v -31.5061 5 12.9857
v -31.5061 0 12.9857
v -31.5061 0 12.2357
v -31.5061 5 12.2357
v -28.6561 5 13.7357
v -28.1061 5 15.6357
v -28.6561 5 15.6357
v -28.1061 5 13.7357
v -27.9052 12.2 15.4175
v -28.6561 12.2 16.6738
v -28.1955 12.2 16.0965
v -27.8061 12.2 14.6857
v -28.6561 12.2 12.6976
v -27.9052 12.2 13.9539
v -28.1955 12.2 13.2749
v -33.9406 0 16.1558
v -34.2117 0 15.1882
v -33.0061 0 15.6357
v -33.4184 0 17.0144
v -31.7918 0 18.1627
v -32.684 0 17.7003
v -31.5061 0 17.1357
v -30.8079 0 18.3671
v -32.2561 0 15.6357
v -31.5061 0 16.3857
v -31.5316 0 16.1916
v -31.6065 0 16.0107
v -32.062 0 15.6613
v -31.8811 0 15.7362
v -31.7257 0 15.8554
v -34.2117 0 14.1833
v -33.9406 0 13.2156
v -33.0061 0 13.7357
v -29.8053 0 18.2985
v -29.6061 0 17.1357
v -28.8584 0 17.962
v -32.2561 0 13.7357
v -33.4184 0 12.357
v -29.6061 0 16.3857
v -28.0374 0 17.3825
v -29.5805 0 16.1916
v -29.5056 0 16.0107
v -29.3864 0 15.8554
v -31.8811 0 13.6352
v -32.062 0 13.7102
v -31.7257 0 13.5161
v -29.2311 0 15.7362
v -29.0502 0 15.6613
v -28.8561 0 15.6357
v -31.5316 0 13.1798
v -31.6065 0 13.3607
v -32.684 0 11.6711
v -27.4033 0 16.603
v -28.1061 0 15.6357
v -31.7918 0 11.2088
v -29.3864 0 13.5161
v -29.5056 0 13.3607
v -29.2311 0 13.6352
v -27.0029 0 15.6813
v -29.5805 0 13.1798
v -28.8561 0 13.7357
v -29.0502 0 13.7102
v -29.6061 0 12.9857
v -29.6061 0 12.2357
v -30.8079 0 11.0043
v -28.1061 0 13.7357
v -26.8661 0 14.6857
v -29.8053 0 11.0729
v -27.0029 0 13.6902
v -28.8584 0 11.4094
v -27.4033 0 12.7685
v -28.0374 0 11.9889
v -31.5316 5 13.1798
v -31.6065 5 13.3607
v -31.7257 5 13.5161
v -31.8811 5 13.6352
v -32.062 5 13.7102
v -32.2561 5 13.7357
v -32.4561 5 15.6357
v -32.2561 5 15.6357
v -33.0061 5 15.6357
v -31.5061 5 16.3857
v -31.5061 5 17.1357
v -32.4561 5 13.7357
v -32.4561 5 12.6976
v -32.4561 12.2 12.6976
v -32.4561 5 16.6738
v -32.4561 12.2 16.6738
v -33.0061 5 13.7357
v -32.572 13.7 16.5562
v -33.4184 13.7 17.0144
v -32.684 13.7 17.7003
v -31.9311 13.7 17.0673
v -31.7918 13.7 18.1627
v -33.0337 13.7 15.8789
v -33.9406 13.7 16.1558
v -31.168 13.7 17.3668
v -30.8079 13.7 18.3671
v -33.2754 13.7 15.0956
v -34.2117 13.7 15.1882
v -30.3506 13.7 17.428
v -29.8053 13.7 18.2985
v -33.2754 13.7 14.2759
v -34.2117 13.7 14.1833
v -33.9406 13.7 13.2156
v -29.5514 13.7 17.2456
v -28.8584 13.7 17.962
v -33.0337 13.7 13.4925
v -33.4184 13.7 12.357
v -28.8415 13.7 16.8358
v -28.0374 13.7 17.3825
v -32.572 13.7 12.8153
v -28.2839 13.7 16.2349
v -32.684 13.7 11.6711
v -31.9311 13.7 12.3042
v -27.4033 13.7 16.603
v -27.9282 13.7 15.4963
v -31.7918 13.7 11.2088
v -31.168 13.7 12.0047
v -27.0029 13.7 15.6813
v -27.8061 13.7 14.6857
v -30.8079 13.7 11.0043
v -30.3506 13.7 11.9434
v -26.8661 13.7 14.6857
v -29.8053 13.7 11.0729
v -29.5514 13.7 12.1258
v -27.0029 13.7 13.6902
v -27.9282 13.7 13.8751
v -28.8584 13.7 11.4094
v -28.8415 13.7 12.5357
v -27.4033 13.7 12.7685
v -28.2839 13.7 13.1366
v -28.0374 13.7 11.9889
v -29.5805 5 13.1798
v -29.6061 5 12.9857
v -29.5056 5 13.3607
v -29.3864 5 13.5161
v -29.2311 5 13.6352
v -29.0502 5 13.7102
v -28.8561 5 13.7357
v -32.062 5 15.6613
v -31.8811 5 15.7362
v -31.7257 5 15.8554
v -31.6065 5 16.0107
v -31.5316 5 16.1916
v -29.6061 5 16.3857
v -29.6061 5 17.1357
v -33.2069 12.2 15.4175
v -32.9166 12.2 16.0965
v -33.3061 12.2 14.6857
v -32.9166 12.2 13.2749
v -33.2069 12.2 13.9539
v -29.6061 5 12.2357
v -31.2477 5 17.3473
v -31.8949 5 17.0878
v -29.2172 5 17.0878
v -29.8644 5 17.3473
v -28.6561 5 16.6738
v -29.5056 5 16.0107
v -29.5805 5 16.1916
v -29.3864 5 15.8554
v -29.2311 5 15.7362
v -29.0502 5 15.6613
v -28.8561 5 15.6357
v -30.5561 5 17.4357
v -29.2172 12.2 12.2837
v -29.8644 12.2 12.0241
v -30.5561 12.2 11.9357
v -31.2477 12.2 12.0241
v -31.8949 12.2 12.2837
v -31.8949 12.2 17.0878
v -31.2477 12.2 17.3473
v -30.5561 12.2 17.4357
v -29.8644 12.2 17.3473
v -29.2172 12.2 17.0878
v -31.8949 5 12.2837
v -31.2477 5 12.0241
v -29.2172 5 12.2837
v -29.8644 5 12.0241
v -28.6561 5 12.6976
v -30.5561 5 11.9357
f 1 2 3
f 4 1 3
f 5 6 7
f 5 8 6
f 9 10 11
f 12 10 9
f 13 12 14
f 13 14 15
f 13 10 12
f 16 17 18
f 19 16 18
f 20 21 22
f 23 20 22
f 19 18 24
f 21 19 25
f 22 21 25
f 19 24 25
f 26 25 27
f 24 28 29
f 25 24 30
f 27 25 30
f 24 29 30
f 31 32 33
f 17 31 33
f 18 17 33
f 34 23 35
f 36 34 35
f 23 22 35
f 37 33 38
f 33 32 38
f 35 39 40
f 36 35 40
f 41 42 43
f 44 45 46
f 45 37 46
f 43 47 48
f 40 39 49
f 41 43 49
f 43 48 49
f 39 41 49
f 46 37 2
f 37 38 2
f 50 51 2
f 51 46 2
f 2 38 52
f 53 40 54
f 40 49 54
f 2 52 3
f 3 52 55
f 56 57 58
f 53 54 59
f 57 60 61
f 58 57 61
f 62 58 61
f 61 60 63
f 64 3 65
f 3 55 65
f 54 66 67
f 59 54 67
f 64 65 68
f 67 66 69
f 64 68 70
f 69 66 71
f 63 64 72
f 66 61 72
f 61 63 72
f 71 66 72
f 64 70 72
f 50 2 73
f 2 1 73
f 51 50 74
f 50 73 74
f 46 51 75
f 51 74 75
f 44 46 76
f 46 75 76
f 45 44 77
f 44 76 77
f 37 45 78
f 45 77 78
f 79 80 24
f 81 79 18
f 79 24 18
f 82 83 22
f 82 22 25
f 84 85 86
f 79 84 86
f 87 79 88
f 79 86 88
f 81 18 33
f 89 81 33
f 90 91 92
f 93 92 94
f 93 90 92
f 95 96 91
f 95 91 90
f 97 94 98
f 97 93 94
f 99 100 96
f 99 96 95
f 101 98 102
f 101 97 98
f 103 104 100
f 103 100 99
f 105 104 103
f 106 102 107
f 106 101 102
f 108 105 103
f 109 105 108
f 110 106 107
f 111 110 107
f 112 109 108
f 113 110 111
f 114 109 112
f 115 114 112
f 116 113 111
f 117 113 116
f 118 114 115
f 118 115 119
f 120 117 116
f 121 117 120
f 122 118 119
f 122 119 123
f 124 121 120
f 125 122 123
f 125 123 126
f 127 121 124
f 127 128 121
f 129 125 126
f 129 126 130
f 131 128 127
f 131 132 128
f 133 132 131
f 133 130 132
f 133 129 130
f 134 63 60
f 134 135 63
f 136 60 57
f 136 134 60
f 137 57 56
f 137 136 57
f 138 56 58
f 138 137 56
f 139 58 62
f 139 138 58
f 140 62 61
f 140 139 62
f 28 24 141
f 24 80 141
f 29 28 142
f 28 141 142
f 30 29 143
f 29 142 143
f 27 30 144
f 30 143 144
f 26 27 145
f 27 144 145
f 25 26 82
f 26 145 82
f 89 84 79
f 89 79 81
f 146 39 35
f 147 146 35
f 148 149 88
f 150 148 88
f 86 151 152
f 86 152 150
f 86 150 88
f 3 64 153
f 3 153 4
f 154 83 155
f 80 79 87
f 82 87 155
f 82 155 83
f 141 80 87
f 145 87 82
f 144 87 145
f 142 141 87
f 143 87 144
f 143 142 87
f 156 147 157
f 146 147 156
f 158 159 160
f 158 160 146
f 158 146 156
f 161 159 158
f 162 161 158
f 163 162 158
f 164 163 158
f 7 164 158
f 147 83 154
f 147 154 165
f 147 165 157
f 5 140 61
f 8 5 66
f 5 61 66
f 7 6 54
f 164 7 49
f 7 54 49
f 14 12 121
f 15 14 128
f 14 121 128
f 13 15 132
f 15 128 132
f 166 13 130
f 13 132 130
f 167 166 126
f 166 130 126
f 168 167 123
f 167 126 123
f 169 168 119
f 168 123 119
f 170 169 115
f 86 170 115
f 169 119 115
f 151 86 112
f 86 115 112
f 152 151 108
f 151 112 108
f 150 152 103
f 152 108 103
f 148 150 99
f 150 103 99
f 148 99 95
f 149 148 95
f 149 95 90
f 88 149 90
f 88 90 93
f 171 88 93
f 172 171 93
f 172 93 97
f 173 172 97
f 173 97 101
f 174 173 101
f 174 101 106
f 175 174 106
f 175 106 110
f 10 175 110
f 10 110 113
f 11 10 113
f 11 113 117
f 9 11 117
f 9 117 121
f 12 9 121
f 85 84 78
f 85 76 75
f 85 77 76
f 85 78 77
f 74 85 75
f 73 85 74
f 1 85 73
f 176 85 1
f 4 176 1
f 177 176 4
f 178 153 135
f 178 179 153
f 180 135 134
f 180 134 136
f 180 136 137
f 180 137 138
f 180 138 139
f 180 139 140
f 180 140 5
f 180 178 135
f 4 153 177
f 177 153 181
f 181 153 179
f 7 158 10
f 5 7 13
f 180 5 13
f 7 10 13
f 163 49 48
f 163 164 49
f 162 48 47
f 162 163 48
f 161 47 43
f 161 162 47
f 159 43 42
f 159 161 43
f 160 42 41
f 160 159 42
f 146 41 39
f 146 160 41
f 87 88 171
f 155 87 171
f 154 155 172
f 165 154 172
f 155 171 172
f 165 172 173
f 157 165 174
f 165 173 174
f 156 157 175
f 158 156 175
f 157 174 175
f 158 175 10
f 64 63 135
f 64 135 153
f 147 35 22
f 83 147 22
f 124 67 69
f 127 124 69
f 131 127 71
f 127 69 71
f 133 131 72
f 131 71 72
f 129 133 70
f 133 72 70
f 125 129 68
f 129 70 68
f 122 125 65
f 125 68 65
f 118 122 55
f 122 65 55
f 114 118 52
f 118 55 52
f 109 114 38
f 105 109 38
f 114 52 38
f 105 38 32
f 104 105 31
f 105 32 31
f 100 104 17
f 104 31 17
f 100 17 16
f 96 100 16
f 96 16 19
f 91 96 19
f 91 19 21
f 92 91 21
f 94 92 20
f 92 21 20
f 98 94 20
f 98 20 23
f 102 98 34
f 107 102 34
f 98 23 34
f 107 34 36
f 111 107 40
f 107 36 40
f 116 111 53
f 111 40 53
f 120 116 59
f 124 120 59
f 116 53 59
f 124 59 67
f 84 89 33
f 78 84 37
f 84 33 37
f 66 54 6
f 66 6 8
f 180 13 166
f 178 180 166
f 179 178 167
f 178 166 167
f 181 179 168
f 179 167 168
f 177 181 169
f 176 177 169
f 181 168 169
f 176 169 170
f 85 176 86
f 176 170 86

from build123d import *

# Parameters (mm, degrees)
SKETCH4_R           = 3.69
BOSS_EXTRUDE2_DEPTH = 13.7
SKETCH5_R           = 2.75
CUT_EXTRUDE2_DEPTH  = 1.5
CUT_EXTRUDE3_DEPTH  = 7.2
SKETCH7_W           = 1.9
SKETCH7_H           = 1.5
SKETCH7_H_2         = 1.9
SKETCH7_W_2         = 1.5
CUT_EXTRUDE5_DEPTH  = 5
FILLET1_R           = 0.75
FILLET2_R           = 0.75
FILLET3_R           = 0.75
FILLET4_R           = 0.75


with BuildPart() as part:
    # Sketch4 → Boss-Extrude2 (new body)
    with BuildSketch(Plane(origin=(0, 0, 0), x_dir=(1, 0, 0), z_dir=(0, 1, 0))):
        with Locations((-30.556065381, -14.685726519)):
            Circle(SKETCH4_R)
    extrude(amount=BOSS_EXTRUDE2_DEPTH)

    # Sketch5 → Cut-Extrude2 (cut)
    with BuildSketch(Plane(origin=(0, 13.7, 0), x_dir=(1, 0, 0), z_dir=(0, 1, 0))):
        with Locations((-30.556065381, -14.685726519)):
            Circle(SKETCH5_R)
    extrude(amount=-CUT_EXTRUDE2_DEPTH, mode=Mode.SUBTRACT)

    # Sketch6 → Cut-Extrude3 (cut)
    with BuildSketch(Plane(origin=(0, 12.2, 0), x_dir=(1, 0, 0), z_dir=(0, 1, 0))):
        with BuildLine():
            ThreePointArc((-32.456065381, -16.673816054), (-30.556065381, -17.435726519), (-28.656065381, -16.673816054))
            Line((-28.656065381, -16.673816054), (-28.656065381, -12.697636984))
            ThreePointArc((-28.656065381, -12.697636984), (-30.556065381, -11.935726519), (-32.456065381, -12.697636984))
            Line((-32.456065381, -12.697636984), (-32.456065381, -16.673816054))
        make_face()
    extrude(amount=-CUT_EXTRUDE3_DEPTH, mode=Mode.SUBTRACT)

    # Sketch7 → Cut-Extrude5 (cut)
    with BuildSketch(Plane(origin=(0, 0, 0), x_dir=(-1, 0, 0), z_dir=(0, -1, 0))):
        with Locations((30.556065381, -16.385726519)):
            Rectangle(SKETCH7_W, SKETCH7_H)
        with Locations((30.556065381, -14.685726519)):
            Rectangle(SKETCH7_W, SKETCH7_H_2)
        with Locations((28.856065381, -14.685726519)):
            Rectangle(SKETCH7_W_2, SKETCH7_H_2)
        with Locations((32.256065381, -14.685726519)):
            Rectangle(SKETCH7_W_2, SKETCH7_H_2)
        with Locations((30.556065381, -12.985726519)):
            Rectangle(SKETCH7_W, SKETCH7_H)
    extrude(amount=-CUT_EXTRUDE5_DEPTH, mode=Mode.SUBTRACT)

    # Fillet1
    fillet1_edges = [part.edges().sort_by_distance(p)[0] for p in [
        (-31.506065381, 2.5, 15.635726519),
    ]]
    fillet(fillet1_edges, radius=FILLET1_R)

    # Fillet2
    fillet2_edges = [part.edges().sort_by_distance(p)[0] for p in [
        (-29.606065381, 2.5, 13.735726519),
    ]]
    fillet(fillet2_edges, radius=FILLET2_R)

    # Fillet3
    fillet3_edges = [part.edges().sort_by_distance(p)[0] for p in [
        (-29.606065381, 2.5, 15.635726519),
    ]]
    fillet(fillet3_edges, radius=FILLET3_R)

    # Fillet4
    fillet4_edges = [part.edges().sort_by_distance(p)[0] for p in [
        (-31.506065381, 2.5, 13.735726519),
    ]]
    fillet(fillet4_edges, radius=FILLET4_R)


solid = part.part
